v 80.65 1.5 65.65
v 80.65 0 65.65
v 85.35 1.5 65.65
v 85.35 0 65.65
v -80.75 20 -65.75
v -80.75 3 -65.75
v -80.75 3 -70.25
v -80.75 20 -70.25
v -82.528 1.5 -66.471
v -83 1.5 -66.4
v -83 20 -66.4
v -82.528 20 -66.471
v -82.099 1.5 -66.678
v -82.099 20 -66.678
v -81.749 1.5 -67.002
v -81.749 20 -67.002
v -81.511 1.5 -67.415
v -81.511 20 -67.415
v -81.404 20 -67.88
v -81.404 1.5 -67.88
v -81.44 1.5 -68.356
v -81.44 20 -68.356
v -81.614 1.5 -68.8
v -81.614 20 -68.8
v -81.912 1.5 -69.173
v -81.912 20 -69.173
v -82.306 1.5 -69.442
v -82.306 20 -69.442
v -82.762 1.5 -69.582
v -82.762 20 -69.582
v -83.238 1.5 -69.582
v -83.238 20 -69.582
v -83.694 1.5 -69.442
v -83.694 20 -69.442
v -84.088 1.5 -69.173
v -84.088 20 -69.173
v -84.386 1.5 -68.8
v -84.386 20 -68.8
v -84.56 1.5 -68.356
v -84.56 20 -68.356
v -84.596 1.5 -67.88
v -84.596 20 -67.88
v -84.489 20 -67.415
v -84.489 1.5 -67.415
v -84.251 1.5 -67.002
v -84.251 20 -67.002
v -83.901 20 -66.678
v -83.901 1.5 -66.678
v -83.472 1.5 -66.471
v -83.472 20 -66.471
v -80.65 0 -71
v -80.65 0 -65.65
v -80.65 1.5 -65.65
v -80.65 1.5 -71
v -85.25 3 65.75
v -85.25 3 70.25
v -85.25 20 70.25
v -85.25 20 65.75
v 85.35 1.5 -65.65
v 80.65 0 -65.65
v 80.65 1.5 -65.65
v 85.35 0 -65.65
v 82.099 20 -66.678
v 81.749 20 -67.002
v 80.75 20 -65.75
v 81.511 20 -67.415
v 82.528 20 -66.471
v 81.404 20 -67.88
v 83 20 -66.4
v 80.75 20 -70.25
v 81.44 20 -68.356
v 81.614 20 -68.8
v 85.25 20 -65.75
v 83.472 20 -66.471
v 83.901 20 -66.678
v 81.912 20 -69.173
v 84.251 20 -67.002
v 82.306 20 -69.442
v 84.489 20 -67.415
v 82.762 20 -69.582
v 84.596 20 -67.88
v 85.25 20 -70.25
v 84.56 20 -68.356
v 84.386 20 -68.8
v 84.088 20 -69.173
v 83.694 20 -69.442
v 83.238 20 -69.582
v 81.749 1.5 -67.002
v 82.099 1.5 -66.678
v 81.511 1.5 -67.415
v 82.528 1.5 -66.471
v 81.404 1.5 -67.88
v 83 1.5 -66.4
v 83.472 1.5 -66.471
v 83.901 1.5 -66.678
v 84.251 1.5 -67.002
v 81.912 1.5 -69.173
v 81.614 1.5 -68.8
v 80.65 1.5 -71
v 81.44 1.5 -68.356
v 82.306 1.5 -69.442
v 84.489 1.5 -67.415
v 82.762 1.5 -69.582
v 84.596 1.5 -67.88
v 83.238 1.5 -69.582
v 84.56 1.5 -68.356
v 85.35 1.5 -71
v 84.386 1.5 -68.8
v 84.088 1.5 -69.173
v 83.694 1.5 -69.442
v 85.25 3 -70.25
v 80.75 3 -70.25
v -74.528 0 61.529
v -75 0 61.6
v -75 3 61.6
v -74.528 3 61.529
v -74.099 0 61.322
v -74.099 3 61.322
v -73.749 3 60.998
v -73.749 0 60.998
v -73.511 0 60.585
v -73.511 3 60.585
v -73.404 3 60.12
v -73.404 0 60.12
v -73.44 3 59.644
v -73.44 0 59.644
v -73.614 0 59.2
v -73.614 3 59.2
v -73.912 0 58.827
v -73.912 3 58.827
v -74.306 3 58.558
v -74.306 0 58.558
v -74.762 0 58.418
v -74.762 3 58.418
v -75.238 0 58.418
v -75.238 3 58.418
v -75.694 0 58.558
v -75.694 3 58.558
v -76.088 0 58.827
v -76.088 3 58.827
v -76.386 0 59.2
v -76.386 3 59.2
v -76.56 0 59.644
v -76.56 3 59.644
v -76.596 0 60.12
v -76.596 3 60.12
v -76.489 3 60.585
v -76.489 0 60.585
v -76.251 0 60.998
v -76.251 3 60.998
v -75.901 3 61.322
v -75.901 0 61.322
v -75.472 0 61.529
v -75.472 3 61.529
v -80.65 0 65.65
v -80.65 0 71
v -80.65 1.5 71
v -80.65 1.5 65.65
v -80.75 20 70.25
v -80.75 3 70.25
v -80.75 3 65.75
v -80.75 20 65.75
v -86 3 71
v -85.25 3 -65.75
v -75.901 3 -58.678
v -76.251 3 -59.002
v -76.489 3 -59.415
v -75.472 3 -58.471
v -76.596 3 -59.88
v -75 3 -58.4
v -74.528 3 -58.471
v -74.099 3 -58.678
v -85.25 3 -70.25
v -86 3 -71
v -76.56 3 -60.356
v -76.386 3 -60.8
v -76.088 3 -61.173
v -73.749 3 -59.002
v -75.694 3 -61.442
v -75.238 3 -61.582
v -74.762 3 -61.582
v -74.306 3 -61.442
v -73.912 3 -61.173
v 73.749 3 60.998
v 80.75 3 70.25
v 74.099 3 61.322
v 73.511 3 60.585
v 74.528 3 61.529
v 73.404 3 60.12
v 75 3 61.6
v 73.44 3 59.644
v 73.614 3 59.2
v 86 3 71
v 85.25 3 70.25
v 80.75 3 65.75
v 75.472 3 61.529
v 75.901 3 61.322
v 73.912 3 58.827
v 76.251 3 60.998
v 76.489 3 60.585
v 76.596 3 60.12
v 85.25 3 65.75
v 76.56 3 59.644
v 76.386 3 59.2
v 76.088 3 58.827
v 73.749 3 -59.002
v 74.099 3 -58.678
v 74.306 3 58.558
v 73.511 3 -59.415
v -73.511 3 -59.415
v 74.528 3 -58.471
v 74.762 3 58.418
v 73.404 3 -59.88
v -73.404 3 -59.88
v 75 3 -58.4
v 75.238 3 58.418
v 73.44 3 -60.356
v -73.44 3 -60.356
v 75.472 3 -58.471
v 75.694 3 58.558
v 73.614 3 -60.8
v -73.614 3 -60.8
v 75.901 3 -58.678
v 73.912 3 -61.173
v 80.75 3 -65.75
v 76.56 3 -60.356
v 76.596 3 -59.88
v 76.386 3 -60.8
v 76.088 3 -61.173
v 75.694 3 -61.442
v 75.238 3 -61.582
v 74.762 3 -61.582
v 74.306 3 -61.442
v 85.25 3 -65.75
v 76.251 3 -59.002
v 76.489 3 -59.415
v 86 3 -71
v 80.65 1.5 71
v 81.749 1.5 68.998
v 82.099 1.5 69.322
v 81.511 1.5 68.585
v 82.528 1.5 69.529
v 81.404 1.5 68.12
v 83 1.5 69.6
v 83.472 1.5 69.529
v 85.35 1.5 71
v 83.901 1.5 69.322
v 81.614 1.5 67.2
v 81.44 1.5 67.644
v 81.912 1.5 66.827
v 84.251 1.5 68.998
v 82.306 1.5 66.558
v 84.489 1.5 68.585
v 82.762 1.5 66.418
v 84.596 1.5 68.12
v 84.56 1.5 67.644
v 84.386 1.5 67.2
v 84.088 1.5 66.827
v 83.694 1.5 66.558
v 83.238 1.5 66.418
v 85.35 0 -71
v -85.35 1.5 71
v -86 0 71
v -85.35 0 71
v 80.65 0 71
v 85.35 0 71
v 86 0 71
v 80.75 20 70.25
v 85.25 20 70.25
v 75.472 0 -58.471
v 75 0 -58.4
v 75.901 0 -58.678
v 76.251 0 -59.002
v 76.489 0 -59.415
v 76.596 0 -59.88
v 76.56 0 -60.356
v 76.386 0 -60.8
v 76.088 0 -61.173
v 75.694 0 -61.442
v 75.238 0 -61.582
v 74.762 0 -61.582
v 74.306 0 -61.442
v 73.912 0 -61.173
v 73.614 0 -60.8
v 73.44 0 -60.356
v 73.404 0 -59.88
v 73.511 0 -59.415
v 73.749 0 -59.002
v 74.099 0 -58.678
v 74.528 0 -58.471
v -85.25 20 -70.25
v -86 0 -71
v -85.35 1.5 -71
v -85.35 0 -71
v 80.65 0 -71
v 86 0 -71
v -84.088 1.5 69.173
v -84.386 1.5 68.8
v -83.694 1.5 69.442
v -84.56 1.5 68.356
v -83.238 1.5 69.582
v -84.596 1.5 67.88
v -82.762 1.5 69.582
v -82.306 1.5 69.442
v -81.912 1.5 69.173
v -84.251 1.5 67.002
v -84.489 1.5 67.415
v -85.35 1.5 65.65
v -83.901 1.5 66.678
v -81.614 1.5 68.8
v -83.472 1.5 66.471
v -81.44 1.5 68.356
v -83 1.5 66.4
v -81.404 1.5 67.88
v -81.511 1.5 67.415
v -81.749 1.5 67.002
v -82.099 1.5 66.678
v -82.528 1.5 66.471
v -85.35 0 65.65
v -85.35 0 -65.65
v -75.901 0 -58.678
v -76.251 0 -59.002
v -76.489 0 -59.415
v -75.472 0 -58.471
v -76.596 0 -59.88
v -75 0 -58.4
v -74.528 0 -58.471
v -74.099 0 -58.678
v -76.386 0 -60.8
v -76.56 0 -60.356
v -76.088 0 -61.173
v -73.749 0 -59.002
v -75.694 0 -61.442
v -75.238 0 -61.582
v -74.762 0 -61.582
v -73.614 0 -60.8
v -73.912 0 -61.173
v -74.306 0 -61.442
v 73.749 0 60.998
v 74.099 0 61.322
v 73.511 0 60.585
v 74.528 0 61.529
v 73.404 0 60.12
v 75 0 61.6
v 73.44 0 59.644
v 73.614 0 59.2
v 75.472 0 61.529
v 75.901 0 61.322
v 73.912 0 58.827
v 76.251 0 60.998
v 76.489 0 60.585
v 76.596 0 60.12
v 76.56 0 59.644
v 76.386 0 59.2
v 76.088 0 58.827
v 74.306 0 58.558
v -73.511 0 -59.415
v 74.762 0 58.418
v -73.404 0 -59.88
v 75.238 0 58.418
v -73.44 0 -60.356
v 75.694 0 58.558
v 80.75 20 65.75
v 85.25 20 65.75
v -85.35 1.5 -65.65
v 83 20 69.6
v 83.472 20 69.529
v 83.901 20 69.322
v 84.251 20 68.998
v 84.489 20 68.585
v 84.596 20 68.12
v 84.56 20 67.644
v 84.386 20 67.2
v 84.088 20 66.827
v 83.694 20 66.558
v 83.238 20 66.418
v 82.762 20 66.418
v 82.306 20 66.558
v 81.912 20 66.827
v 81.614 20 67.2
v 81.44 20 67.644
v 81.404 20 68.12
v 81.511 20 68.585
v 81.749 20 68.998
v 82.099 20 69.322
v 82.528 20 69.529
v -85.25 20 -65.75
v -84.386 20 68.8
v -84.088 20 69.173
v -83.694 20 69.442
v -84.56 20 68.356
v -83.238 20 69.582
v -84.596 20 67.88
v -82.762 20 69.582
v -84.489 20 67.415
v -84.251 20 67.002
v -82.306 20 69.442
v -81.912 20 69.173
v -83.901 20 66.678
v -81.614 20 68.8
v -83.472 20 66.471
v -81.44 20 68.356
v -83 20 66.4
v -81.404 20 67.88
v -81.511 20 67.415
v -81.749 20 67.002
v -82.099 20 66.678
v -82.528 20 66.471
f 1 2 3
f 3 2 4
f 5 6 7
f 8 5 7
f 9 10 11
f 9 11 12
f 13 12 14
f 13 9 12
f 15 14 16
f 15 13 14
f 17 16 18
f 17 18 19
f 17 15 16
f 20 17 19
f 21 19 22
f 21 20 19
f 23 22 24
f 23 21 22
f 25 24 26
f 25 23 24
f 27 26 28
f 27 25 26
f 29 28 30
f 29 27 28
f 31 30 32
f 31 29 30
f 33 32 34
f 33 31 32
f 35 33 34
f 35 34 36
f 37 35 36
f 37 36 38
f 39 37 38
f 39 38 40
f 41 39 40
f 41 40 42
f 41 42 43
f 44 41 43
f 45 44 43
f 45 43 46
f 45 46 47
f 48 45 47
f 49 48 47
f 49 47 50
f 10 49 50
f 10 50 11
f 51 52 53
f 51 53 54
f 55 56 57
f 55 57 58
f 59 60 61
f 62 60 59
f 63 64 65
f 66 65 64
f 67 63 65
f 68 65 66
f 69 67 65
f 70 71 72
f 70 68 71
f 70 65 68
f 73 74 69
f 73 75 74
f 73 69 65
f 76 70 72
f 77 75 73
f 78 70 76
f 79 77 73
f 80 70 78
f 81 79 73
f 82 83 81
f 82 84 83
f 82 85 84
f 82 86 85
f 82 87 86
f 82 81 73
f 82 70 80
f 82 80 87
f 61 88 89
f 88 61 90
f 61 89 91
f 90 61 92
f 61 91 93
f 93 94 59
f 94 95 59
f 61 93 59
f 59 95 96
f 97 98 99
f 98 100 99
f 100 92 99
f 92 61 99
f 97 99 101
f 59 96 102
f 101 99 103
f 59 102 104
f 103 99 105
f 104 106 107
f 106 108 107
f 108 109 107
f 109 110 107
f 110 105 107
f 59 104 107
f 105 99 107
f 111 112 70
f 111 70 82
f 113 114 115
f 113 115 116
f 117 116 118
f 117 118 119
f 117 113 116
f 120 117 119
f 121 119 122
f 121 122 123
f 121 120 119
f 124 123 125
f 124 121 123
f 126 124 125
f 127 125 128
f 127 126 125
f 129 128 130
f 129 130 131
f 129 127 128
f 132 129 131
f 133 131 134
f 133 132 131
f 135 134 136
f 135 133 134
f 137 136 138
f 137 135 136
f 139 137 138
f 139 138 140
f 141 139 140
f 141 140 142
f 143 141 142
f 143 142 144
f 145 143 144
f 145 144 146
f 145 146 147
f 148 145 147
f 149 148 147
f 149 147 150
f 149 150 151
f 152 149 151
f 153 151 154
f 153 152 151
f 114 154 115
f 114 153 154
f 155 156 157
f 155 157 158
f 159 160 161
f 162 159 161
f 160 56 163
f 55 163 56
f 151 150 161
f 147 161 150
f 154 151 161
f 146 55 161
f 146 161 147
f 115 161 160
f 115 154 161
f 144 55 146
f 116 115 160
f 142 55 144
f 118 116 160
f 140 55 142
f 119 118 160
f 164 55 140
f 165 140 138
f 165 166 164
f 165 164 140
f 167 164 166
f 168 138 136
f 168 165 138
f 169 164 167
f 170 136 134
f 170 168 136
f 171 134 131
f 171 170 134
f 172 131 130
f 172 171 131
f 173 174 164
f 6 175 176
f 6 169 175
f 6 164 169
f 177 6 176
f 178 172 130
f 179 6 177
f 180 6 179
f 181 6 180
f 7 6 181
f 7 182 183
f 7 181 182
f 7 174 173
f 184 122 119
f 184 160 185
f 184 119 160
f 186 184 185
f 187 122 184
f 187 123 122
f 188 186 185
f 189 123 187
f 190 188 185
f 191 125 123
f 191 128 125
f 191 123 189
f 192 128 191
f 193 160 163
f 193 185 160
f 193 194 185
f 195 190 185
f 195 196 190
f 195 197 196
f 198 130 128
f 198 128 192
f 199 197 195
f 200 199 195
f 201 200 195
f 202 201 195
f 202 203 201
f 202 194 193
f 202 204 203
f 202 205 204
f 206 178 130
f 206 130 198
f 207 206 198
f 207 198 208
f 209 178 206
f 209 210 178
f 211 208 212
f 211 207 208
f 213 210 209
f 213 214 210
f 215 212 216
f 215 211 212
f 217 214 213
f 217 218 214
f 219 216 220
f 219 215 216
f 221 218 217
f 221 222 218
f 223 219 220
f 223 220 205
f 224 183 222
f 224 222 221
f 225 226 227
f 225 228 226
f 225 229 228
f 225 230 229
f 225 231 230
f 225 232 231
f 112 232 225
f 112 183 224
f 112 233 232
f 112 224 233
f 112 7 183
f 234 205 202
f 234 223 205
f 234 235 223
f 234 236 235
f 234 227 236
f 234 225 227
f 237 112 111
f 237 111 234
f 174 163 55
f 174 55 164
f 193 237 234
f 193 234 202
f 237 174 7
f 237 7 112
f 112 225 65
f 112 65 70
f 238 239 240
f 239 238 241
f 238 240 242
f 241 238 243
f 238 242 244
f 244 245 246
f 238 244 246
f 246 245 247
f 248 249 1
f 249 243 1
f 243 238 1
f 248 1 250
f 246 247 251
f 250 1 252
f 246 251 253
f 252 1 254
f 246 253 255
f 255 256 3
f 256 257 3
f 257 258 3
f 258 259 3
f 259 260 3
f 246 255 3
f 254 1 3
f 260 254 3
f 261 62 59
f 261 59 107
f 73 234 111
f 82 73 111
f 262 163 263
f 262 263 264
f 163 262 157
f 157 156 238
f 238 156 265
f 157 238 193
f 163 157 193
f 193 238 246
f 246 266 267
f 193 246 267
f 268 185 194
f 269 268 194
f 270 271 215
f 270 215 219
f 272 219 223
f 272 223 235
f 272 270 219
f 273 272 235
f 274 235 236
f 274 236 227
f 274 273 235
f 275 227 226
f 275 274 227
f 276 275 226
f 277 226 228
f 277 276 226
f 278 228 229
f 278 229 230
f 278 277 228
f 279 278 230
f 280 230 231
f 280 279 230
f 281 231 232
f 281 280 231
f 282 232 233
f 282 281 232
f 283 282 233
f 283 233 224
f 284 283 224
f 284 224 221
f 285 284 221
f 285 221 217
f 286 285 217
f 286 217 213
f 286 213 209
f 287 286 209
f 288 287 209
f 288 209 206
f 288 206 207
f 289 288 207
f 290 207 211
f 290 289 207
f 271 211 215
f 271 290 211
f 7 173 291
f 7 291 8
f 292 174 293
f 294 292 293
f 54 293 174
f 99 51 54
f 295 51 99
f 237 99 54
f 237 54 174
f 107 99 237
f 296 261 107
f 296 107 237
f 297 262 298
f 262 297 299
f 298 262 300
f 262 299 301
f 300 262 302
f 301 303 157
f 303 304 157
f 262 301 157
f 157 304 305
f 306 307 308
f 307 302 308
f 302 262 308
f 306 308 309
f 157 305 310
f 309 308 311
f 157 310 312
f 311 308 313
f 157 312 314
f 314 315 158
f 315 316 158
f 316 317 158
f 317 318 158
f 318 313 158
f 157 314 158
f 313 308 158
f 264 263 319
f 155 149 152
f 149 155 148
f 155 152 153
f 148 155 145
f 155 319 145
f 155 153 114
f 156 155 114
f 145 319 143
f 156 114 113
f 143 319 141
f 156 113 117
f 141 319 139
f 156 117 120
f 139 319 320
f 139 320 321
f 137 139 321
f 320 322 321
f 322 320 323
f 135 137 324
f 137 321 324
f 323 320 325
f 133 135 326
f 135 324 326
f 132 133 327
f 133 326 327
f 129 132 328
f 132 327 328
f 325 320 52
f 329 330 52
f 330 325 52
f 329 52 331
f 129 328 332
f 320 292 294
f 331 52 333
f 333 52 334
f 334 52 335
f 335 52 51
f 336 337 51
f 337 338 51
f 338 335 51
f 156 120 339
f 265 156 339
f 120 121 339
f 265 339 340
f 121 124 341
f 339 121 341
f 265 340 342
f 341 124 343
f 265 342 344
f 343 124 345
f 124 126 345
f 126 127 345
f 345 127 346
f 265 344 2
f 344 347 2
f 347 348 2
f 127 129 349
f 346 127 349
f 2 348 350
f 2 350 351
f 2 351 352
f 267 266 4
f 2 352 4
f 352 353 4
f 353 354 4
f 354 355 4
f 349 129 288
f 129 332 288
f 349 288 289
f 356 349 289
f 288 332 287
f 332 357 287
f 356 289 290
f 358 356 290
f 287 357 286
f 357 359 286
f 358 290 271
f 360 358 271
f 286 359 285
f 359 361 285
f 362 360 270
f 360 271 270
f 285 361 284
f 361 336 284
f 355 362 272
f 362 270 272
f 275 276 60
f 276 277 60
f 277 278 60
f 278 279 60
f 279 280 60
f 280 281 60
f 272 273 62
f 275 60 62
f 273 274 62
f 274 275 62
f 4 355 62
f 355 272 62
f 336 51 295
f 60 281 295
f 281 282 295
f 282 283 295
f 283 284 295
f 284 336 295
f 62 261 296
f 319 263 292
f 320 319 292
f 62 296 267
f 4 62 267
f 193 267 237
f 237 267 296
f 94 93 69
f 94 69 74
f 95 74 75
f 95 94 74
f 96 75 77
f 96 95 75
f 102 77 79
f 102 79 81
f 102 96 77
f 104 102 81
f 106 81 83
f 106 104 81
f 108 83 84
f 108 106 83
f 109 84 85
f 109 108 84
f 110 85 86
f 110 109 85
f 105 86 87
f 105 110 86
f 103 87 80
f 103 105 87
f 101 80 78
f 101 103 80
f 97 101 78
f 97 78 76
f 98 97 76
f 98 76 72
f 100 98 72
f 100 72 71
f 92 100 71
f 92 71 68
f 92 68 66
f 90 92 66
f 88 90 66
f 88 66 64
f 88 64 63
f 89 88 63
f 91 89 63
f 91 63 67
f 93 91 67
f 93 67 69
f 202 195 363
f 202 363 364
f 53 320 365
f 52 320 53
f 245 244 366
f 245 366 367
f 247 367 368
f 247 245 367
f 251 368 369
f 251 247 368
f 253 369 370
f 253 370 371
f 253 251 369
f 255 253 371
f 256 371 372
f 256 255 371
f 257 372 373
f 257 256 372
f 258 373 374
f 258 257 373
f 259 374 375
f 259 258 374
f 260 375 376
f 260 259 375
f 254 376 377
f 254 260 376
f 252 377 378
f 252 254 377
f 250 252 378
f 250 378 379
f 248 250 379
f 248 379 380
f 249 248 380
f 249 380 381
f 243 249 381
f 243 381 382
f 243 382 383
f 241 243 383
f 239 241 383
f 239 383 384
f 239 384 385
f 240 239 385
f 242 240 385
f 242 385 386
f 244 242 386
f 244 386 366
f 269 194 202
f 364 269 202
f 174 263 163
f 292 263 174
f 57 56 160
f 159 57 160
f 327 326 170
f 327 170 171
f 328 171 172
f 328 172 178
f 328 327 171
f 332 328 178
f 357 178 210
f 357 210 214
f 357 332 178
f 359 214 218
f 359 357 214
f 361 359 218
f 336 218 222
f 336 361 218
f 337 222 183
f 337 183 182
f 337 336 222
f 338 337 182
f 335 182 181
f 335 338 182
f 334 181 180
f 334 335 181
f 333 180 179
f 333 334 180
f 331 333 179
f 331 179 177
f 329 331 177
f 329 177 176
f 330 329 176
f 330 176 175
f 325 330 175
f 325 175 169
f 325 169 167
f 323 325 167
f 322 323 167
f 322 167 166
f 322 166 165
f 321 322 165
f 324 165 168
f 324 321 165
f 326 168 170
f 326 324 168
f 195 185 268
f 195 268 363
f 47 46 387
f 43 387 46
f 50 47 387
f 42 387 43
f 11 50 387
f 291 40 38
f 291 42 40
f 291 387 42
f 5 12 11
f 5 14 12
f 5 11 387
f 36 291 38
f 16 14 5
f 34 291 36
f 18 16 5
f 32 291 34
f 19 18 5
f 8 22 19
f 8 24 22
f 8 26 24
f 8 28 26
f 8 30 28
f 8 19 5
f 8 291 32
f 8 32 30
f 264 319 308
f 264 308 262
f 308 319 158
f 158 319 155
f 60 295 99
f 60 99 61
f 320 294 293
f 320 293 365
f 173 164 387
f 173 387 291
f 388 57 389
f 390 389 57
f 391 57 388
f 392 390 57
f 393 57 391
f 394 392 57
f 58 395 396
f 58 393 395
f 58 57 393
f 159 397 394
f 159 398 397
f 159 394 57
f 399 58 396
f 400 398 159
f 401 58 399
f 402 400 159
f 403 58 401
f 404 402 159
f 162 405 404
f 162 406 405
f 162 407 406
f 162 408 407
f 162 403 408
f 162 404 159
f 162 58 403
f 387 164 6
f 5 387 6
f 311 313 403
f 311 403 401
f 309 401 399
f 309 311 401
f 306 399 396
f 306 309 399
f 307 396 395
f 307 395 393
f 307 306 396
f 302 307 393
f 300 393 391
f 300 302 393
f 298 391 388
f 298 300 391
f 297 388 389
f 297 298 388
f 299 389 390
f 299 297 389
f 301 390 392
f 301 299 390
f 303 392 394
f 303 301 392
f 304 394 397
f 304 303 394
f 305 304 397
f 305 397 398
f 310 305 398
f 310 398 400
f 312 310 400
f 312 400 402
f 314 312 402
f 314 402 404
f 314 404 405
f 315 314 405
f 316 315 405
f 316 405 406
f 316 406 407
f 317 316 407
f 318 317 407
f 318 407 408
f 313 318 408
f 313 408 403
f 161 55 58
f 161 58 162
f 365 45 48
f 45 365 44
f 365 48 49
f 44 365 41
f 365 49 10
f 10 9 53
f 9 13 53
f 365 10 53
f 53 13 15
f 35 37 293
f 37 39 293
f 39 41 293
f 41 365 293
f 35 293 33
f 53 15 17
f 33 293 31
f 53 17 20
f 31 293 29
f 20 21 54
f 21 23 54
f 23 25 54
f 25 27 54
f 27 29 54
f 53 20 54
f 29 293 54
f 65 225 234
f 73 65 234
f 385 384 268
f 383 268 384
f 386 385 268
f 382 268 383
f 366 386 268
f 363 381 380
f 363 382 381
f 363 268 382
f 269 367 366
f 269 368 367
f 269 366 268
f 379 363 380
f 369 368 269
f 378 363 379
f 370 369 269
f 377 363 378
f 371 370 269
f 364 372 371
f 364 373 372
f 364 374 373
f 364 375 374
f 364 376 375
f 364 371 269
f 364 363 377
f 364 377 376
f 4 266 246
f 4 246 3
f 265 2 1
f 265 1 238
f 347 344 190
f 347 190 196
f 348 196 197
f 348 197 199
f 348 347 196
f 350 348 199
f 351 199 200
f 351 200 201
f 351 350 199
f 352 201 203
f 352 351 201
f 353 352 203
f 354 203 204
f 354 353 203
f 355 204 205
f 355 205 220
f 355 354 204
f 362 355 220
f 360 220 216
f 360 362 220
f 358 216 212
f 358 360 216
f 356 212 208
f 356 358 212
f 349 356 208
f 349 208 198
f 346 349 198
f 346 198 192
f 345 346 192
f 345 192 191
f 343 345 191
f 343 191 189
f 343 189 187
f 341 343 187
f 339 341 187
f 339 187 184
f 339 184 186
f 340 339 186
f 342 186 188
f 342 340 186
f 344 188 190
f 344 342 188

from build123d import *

# Parameters (mm, degrees)
SKETCH1_W           = 172
SKETCH1_H           = 142
SKETCH1_R           = 1.6
BOSS_EXTRUDE1_DEPTH = 3
SKETCH1_3_W         = 4.5
SKETCH1_3_H         = 4.5
SKETCH1_3_R         = 1.6
BOSS_EXTRUDE2_DEPTH = 20
SKETCH1_5_W         = 4.7
SKETCH1_5_H         = 5.35
SKETCH1_5_R         = 1.6
CUT_EXTRUDE1_DEPTH  = 1.5


with BuildPart() as part:
    # Sketch1 → Boss-Extrude1 (new body)
    with BuildSketch(Plane(origin=(0, 0, 0), x_dir=(1, 0, 0), z_dir=(0, 1, 0))):
        Rectangle(SKETCH1_W, SKETCH1_H)
        with Locations((-75, 60)):
            Circle(SKETCH1_R, mode=Mode.SUBTRACT)
        with Locations((75, 60)):
            Circle(SKETCH1_R, mode=Mode.SUBTRACT)
        with Locations((-75, -60)):
            Circle(SKETCH1_R, mode=Mode.SUBTRACT)
        with Locations((75, -60)):
            Circle(SKETCH1_R, mode=Mode.SUBTRACT)
        with Locations((-83, 68)):
            Circle(SKETCH1_R, mode=Mode.SUBTRACT)
        with Locations((83, 68)):
            Circle(SKETCH1_R, mode=Mode.SUBTRACT)
        with Locations((83, -68)):
            Circle(SKETCH1_R, mode=Mode.SUBTRACT)
        with Locations((-83, -68)):
            Circle(SKETCH1_R, mode=Mode.SUBTRACT)
    extrude(amount=BOSS_EXTRUDE1_DEPTH)

    # Sketch1<3> → Boss-Extrude2 (add)
    # profile 1 of 4: a face of its own
    with BuildSketch(Plane(origin=(0, 0, 0), x_dir=(1, 0, 0), z_dir=(0, 1, 0))):
        with Locations((-83, 68)):
            Rectangle(SKETCH1_3_W, SKETCH1_3_H)
        with Locations((-83, 68)):
            Circle(SKETCH1_3_R, mode=Mode.SUBTRACT)
    # profile 2 of 4: a face of its own
    with BuildSketch(Plane(origin=(0, 0, 0), x_dir=(1, 0, 0), z_dir=(0, 1, 0))):
        with Locations((83, 68)):
            Rectangle(SKETCH1_3_W, SKETCH1_3_H)
        with Locations((83, 68)):
            Circle(SKETCH1_3_R, mode=Mode.SUBTRACT)
    # profile 3 of 4: a face of its own
    with BuildSketch(Plane(origin=(0, 0, 0), x_dir=(1, 0, 0), z_dir=(0, 1, 0))):
        with Locations((83, -68)):
            Rectangle(SKETCH1_3_W, SKETCH1_3_H)
        with Locations((83, -68)):
            Circle(SKETCH1_3_R, mode=Mode.SUBTRACT)
    # profile 4 of 4: a face of its own
    with BuildSketch(Plane(origin=(0, 0, 0), x_dir=(1, 0, 0), z_dir=(0, 1, 0))):
        with Locations((-83, -68)):
            Rectangle(SKETCH1_3_W, SKETCH1_3_H)
        with Locations((-83, -68)):
            Circle(SKETCH1_3_R, mode=Mode.SUBTRACT)
    extrude(amount=BOSS_EXTRUDE2_DEPTH)

    # Sketch1<5> → Cut-Extrude1 (cut)
    # profile 1 of 4: a face of its own
    with BuildSketch(Plane(origin=(0, 0, 0), x_dir=(1, 0, 0), z_dir=(0, 1, 0))):
        with Locations((-83, 68.325)):
            Rectangle(SKETCH1_5_W, SKETCH1_5_H)
        with Locations((-83, 68)):
            Circle(SKETCH1_5_R, mode=Mode.SUBTRACT)
    # profile 2 of 4: a face of its own
    with BuildSketch(Plane(origin=(0, 0, 0), x_dir=(1, 0, 0), z_dir=(0, 1, 0))):
        with Locations((83, 68.325)):
            Rectangle(SKETCH1_5_W, SKETCH1_5_H)
        with Locations((83, 68)):
            Circle(SKETCH1_5_R, mode=Mode.SUBTRACT)
    # profile 3 of 4: a face of its own
    with BuildSketch(Plane(origin=(0, 0, 0), x_dir=(1, 0, 0), z_dir=(0, 1, 0))):
        with Locations((-83, -68.325)):
            Rectangle(SKETCH1_5_W, SKETCH1_5_H)
        with Locations((-83, -68)):
            Circle(SKETCH1_5_R, mode=Mode.SUBTRACT)
    # profile 4 of 4: a face of its own
    with BuildSketch(Plane(origin=(0, 0, 0), x_dir=(1, 0, 0), z_dir=(0, 1, 0))):
        with Locations((83, -68.325)):
            Rectangle(SKETCH1_5_W, SKETCH1_5_H)
        with Locations((83, -68)):
            Circle(SKETCH1_5_R, mode=Mode.SUBTRACT)
    extrude(amount=CUT_EXTRUDE1_DEPTH, mode=Mode.SUBTRACT)


solid = part.part
